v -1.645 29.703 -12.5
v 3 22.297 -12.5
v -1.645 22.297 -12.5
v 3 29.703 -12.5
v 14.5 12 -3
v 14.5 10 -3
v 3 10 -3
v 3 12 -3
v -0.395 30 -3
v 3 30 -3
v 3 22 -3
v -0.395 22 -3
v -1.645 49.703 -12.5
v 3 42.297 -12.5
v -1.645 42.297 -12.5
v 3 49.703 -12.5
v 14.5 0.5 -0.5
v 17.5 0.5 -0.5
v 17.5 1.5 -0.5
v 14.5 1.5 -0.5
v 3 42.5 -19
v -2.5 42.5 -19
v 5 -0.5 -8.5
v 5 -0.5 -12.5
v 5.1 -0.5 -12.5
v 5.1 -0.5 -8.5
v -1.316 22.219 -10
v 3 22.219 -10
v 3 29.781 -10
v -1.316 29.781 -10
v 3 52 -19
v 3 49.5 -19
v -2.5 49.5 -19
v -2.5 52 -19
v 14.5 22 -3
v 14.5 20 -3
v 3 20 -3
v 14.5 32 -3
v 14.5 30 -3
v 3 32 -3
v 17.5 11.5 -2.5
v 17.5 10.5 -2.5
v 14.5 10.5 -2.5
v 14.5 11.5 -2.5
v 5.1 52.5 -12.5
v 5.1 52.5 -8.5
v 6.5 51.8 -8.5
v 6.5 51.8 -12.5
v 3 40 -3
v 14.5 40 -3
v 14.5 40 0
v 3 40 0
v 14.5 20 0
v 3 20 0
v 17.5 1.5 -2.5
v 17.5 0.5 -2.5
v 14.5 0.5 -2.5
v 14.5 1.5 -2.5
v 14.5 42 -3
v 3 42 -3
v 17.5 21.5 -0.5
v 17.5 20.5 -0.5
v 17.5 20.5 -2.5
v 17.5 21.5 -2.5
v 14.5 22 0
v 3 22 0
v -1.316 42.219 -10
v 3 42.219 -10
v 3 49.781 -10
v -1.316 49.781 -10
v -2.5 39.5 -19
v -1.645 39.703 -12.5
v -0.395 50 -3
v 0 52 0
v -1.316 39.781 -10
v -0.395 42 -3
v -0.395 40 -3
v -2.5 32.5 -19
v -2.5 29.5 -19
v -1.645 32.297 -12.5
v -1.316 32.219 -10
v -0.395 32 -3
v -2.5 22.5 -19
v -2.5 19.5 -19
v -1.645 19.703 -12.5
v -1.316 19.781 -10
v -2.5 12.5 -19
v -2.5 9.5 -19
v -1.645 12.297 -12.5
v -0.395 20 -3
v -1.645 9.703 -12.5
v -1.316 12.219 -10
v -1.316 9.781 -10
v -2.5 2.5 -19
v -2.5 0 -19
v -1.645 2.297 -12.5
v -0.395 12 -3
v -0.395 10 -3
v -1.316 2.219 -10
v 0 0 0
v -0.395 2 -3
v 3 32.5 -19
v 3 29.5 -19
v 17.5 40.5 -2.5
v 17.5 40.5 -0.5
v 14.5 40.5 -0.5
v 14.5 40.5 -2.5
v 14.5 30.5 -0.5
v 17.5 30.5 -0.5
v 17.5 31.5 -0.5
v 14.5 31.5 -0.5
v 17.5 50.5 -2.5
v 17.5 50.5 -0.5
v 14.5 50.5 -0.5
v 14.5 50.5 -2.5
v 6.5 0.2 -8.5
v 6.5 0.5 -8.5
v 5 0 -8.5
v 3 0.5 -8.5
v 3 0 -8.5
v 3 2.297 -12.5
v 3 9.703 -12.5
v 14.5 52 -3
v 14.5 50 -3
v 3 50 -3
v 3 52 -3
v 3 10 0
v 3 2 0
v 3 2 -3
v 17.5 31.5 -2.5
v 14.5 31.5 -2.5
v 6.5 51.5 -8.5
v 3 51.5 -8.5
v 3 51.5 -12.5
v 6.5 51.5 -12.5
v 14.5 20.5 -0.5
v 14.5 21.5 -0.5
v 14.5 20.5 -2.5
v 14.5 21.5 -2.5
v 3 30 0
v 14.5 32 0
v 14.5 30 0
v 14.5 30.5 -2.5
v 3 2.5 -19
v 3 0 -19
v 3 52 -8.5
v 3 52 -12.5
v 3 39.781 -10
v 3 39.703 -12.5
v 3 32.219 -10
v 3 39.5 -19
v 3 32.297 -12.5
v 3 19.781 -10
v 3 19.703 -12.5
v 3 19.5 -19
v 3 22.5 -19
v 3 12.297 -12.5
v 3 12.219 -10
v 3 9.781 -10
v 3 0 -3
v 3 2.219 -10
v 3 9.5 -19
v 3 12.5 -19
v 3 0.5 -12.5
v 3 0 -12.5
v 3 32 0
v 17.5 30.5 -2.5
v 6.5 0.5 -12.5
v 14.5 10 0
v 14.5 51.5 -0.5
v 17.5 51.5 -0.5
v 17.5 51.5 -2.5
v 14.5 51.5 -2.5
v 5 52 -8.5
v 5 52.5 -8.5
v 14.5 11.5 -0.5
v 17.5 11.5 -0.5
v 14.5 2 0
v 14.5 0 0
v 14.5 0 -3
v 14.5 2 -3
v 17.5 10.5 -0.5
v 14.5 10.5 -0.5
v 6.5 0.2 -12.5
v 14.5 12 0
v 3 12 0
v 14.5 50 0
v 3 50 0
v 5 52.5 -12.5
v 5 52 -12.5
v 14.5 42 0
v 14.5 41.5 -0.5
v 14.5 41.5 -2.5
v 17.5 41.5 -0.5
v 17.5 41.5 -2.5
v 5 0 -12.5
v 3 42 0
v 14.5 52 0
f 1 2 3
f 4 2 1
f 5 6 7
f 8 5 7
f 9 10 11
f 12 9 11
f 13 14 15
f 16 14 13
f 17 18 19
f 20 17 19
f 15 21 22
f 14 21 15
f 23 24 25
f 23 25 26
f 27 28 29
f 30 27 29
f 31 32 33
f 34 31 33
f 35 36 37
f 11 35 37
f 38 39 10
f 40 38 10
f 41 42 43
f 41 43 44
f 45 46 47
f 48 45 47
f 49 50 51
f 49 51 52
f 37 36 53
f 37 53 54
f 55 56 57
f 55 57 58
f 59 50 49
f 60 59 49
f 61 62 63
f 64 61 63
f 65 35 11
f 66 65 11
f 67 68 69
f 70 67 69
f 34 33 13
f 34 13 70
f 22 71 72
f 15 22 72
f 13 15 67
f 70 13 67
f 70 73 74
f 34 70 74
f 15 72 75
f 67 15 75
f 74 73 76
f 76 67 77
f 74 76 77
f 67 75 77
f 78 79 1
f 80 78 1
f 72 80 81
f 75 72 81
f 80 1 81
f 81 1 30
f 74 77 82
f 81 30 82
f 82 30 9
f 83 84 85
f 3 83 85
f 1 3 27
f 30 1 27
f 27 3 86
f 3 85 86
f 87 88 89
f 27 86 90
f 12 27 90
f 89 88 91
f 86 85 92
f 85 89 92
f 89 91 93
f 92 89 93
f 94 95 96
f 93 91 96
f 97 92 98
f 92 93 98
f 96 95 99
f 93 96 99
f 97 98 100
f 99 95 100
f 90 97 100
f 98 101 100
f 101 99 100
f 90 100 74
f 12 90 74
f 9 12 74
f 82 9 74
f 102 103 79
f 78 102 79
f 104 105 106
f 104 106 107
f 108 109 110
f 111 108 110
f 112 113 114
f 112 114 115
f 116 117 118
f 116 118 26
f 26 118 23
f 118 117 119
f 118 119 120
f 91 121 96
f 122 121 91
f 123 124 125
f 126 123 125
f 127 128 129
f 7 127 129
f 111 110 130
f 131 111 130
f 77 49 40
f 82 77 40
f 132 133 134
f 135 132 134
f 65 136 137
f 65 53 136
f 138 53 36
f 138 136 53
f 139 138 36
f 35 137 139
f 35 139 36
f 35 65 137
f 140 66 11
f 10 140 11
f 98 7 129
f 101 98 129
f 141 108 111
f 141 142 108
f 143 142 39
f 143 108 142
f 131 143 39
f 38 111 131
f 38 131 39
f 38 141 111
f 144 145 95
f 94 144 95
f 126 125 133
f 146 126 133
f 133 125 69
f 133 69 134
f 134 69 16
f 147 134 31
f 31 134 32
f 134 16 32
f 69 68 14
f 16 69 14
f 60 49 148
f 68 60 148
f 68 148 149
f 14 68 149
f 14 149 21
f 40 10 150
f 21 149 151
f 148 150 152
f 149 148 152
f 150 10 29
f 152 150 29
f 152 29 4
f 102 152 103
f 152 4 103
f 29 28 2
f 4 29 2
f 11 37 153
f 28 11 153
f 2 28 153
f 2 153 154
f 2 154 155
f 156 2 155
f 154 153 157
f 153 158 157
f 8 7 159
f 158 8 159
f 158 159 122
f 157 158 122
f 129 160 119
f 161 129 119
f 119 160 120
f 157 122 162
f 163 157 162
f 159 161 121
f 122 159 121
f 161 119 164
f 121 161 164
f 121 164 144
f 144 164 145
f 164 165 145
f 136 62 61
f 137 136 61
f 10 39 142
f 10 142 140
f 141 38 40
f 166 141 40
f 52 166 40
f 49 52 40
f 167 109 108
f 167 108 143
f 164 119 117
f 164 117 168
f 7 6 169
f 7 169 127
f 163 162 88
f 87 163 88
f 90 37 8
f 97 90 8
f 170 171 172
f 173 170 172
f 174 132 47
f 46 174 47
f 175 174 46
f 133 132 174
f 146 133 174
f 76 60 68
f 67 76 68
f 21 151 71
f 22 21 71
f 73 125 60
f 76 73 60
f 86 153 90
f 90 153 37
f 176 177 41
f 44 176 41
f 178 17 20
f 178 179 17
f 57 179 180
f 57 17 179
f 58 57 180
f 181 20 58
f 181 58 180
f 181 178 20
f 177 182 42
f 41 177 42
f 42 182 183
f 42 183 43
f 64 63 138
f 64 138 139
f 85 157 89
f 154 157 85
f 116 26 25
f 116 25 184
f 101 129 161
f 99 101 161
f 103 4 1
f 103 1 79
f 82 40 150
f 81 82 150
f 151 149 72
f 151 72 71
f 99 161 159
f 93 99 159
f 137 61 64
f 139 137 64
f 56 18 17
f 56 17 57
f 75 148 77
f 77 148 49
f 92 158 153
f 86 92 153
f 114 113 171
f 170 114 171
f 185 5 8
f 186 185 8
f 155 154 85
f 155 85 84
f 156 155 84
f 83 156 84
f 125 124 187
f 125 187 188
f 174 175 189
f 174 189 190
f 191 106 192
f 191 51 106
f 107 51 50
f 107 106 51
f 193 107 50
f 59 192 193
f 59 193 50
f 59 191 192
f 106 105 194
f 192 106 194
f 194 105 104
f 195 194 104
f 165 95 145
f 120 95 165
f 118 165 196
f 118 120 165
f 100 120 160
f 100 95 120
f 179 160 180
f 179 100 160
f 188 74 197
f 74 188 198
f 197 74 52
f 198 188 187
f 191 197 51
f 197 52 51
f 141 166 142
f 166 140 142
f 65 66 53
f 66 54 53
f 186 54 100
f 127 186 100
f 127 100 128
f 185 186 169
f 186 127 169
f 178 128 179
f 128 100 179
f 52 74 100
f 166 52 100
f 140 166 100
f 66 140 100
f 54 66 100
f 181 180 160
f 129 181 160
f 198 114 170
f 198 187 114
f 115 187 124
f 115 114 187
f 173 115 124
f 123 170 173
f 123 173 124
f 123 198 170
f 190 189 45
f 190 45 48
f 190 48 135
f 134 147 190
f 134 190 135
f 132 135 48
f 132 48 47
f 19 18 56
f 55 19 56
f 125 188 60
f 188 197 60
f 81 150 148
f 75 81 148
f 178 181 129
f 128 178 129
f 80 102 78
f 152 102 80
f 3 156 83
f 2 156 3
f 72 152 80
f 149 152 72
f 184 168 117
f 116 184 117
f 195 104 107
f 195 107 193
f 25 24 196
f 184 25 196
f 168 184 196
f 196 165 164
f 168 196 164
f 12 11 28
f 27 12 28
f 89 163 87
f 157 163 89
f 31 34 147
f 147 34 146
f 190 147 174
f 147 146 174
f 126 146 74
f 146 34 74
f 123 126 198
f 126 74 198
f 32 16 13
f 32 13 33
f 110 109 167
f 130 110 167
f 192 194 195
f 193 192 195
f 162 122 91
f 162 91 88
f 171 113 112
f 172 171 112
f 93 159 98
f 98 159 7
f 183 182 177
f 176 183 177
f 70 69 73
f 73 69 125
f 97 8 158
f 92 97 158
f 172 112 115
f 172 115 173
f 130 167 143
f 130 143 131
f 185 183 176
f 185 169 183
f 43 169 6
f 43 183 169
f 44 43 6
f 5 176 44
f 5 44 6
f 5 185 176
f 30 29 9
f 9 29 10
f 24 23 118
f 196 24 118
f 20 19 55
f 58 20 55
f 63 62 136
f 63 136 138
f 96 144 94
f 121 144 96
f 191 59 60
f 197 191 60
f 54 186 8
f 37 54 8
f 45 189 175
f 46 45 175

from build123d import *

# Parameters (mm, degrees)
EXTRUDE_1_DEPTH        = 52
SKETCH_2_W             = 14.5
SKETCH_2_H             = 8
CUT_EXTRUDE_1_DEPTH    = 4
PATTERN_LINEAR_1_COUNT = 5
PATTERN_LINEAR_1_PITCH = 10
CUT_EXTRUDE_2_DEPTH    = 6.5
PATTERN_LINEAR_2_COUNT = 5
PATTERN_LINEAR_2_PITCH = 10
SKETCH_5_W             = 3
SKETCH_5_H             = 2
SKETCH_5_W_2           = 2
SKETCH_5_H_2           = 1
CUT_EXTRUDE_3_DEPTH    = 3
PATTERN_LINEAR_3_COUNT = 6
PATTERN_LINEAR_3_PITCH = 10
EXTRUDE_2_DEPTH        = 3.5
SKETCH_8_W             = 2
SKETCH_8_H             = 0.5
CUT_EXTRUDE_4_DEPTH    = 5


with BuildPart() as part:
    # 草图1 → 凸台-拉伸1 (new body)
    with BuildSketch(Plane(origin=(0, 0, 0), x_dir=(1, 0, 0), z_dir=(0, 1, 0))):
        Polygon((0, 19), (-2.5, 19), (0, 0), (17.5, 0), (17.5, 3), (3, 3), (3, 19), align=None)
    extrude(amount=EXTRUDE_1_DEPTH)

    # 草图2 → 切除-拉伸1 (cut, through all)
    with BuildSketch(Plane(origin=(0, 0, -3), x_dir=(-1, 0, 0), z_dir=(0, 0, -1))):
        with Locations((-10.25, 46)):
            Rectangle(SKETCH_2_W, SKETCH_2_H)
    cut_extrude_1 = extrude(amount=-CUT_EXTRUDE_1_DEPTH, mode=Mode.SUBTRACT)

    # 阵列(线性)1: 切除-拉伸1 ×5
    with Locations(*[(0, -i * PATTERN_LINEAR_1_PITCH, 0) for i in range(1, PATTERN_LINEAR_1_COUNT)]):
        add(cut_extrude_1, mode=Mode.SUBTRACT)

    # 草图4 → 切除-拉伸2 (cut, through all)
    with BuildSketch(Plane(origin=(3, 0, 0), x_dir=(0, 0, -1), z_dir=(1, 0, 0))):
        Polygon((3, 50), (3, 42), (10, 42.21875), (10, 49.78125), align=None)
        Polygon((19, 49.5), (19, 42.5), (12.5, 42.296875), (12.5, 49.703125), align=None)
    cut_extrude_2 = extrude(amount=-CUT_EXTRUDE_2_DEPTH, mode=Mode.SUBTRACT)

    # 阵列(线性)2: 切除-拉伸2 ×5
    with Locations(*[(0, -i * PATTERN_LINEAR_2_PITCH, 0) for i in range(1, PATTERN_LINEAR_2_COUNT)]):
        add(cut_extrude_2, mode=Mode.SUBTRACT)

    # 草图5 → 切除-拉伸3 (cut)
    with BuildSketch(Plane(origin=(17.5, 0, 0), x_dir=(0, 0, -1), z_dir=(1, 0, 0))):
        with Locations((1.5, 51)):
            Rectangle(SKETCH_5_W, SKETCH_5_H)
        with Locations((1.5, 51)):
            Rectangle(SKETCH_5_W_2, SKETCH_5_H_2, mode=Mode.SUBTRACT)
    cut_extrude_3 = extrude(amount=-CUT_EXTRUDE_3_DEPTH, mode=Mode.SUBTRACT)

    # 阵列(线性)3: 切除-拉伸3 ×6
    with Locations(*[(0, -i * PATTERN_LINEAR_3_PITCH, 0) for i in range(1, PATTERN_LINEAR_3_COUNT)]):
        add(cut_extrude_3, mode=Mode.SUBTRACT)

    # 草图6 → 凸台-拉伸2 (add)
    with BuildSketch(Plane(origin=(3, 0, 0), x_dir=(0, 0, -1), z_dir=(1, 0, 0))):
        Polygon((8.5, 0), (8.5, 0.5), (12.5, 0.5), (12.5, 0), (12.5, -0.5), (8.5, -0.5), align=None)
    extrude_2 = extrude(amount=EXTRUDE_2_DEPTH)

    # 草图8 → 切除-拉伸4 (cut)
    with BuildSketch(Plane.XY.offset(-8.5)):
        with Locations((4, -0.25)):
            Rectangle(SKETCH_8_W, SKETCH_8_H)
        Polygon((6.5, -0.5), (5.1, -0.5), (6.5, 0.2), align=None)
    cut_extrude_4 = extrude(amount=-CUT_EXTRUDE_4_DEPTH, mode=Mode.SUBTRACT)

    # 镜向1: 凸台-拉伸2, 切除-拉伸4 across plane
    add(extrude_2.mirror(Plane.ZX.offset(26)))
    add(cut_extrude_4.mirror(Plane.ZX.offset(26)), mode=Mode.SUBTRACT)


solid = part.part
